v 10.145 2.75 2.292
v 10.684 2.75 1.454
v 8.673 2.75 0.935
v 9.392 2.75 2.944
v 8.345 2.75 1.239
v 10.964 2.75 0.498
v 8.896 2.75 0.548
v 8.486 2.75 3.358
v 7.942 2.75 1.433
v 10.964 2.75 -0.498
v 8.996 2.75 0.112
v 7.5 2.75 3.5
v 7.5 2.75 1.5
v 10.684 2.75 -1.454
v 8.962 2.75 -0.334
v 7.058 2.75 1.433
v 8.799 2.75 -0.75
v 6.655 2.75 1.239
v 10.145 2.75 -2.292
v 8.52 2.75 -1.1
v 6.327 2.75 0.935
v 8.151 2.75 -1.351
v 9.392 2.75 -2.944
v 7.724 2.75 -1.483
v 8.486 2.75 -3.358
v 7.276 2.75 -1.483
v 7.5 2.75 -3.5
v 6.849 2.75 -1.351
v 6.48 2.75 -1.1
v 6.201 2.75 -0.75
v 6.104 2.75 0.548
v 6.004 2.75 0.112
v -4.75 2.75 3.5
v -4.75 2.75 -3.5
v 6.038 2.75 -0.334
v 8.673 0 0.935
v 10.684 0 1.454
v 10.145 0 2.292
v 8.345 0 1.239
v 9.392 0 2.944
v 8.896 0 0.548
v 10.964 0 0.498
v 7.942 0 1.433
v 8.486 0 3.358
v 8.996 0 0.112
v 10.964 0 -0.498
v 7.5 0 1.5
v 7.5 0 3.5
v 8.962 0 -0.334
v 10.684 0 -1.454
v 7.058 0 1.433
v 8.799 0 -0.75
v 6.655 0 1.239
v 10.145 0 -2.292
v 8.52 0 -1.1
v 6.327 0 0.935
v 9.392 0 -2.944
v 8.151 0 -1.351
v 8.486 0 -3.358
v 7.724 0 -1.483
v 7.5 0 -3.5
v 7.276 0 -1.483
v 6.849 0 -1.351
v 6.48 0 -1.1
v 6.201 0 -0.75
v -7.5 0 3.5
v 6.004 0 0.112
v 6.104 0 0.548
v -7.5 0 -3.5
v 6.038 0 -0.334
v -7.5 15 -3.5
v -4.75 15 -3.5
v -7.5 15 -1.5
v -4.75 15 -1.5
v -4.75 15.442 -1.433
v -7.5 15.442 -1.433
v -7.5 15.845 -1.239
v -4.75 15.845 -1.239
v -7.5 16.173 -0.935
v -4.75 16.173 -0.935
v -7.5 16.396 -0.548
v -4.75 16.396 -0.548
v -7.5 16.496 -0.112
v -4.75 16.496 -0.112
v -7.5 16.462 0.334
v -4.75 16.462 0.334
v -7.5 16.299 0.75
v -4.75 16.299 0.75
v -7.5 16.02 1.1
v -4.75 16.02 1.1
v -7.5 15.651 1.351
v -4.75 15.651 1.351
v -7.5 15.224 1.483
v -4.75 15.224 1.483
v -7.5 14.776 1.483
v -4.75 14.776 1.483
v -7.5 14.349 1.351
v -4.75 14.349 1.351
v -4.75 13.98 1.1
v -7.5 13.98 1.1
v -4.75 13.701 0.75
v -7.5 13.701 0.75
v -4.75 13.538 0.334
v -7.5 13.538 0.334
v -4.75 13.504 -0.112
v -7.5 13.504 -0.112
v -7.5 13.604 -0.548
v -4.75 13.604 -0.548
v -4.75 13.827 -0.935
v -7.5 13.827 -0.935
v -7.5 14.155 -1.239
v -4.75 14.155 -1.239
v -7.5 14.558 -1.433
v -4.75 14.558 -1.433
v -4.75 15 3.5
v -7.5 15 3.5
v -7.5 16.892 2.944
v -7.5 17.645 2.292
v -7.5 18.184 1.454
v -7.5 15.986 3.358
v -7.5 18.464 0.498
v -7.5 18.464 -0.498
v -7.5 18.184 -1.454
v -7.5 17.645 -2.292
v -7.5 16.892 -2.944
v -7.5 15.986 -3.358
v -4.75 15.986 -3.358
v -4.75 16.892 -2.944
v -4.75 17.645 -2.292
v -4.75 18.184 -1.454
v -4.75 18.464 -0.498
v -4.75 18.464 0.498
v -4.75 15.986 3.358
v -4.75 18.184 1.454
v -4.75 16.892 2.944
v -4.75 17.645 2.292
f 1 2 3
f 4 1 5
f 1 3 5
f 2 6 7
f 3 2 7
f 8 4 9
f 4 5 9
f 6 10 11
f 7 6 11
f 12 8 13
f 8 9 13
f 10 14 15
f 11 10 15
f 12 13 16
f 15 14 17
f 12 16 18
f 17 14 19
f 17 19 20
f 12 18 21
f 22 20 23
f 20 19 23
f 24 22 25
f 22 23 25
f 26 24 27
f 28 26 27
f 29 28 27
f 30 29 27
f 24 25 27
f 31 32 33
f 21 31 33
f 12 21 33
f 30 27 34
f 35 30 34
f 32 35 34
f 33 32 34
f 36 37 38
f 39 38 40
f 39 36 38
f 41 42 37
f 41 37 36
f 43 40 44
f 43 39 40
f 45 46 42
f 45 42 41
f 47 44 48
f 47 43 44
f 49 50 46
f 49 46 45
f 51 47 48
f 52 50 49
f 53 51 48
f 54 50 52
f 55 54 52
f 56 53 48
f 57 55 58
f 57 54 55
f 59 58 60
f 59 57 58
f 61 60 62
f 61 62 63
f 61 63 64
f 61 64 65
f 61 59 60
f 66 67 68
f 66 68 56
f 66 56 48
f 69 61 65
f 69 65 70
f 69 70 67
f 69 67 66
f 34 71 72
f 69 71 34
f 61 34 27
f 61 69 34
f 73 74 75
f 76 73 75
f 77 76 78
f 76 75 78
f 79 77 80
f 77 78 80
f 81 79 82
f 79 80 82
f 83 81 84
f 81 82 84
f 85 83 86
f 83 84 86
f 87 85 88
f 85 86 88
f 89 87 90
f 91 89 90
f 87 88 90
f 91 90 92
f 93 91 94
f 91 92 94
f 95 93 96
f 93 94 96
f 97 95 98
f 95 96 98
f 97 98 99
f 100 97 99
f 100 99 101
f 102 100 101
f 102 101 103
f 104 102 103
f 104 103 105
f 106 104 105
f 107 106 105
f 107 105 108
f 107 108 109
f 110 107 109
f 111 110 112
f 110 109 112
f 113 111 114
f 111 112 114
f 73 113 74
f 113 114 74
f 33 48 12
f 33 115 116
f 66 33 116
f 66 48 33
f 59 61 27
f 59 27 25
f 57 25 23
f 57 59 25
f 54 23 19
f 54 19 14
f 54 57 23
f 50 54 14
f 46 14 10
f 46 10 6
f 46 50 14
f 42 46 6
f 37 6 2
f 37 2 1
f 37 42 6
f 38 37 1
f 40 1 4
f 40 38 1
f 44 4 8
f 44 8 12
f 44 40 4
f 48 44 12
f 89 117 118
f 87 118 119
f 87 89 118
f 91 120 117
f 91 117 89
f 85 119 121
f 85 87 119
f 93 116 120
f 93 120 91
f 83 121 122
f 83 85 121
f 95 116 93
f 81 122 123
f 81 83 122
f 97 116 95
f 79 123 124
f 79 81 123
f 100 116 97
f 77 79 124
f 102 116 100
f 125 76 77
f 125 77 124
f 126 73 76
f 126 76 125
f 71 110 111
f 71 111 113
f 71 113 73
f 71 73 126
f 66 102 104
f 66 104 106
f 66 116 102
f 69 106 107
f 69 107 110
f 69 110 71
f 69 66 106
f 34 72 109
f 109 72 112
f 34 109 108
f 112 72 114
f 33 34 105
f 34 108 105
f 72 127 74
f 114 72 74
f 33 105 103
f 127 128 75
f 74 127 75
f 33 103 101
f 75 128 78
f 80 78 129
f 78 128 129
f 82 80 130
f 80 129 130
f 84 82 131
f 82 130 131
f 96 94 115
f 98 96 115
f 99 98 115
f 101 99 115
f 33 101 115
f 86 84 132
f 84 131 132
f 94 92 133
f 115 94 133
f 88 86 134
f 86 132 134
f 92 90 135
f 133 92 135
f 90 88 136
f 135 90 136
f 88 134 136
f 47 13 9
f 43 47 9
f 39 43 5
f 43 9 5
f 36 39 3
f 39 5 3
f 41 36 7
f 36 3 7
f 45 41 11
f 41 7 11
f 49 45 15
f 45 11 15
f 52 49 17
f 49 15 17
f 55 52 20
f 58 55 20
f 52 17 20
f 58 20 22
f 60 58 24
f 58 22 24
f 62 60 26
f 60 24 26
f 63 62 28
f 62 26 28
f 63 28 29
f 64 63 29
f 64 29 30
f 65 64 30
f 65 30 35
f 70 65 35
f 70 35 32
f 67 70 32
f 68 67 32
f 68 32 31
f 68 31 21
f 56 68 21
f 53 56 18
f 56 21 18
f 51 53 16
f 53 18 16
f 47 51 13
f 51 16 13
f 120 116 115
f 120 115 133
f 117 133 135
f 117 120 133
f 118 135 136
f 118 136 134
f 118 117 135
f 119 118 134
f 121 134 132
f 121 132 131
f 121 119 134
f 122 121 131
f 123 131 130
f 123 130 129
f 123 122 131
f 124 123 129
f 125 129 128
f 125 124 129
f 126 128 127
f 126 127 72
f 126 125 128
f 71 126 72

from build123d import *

# Parameters (mm, degrees)
BOSS_EXTRUDE1_DEPTH = 2.75
SKETCH3_R           = 1.5
CUT_EXTRUDE1_DEPTH  = 2.75
BOSS_EXTRUDE2_DEPTH = 2.75
SKETCH6_R           = 1.5
CUT_EXTRUDE2_DEPTH  = 2.75


with BuildPart() as part:
    # Sketch1 → Boss-Extrude1 (new body)
    with BuildSketch(Plane(origin=(0, 0, 0), x_dir=(1, 0, 0), z_dir=(0, 1, 0))):
        with BuildLine():
            Line((-7.5, 3.5), (7.5, 3.5))
            ThreePointArc((7.5, 3.5), (11, 0), (7.5, -3.5))
            Line((7.5, -3.5), (-7.5, -3.5))
            Line((-7.5, -3.5), (-7.5, 3.5))
        make_face()
    extrude(amount=BOSS_EXTRUDE1_DEPTH)

    # Sketch3 → Cut-Extrude1 (cut)
    with BuildSketch(Plane(origin=(0, 2.75, 0), x_dir=(1, 0, 0), z_dir=(0, 1, 0))):
        with Locations(Location((7.5, 0, 0), (0, 0, 270))):
            Circle(SKETCH3_R)
    extrude(amount=-CUT_EXTRUDE1_DEPTH, mode=Mode.SUBTRACT)

    # Sketch5 → Boss-Extrude2 (add)
    with BuildSketch(Plane.ZY.offset(7.5)):
        with BuildLine():
            Line((-3.5, 0), (3.5, 0))
            Line((3.5, 0), (3.5, 15))
            ThreePointArc((3.5, 15), (0, 18.5), (-3.5, 15))
            Line((-3.5, 15), (-3.5, 0))
        make_face()
    extrude(amount=-BOSS_EXTRUDE2_DEPTH)

    # Sketch6 → Cut-Extrude2 (cut)
    with BuildSketch(Plane(origin=(-4.75, 0, 0), x_dir=(0, 0, -1), z_dir=(1, 0, 0))):
        with Locations((0, 15)):
            Circle(SKETCH6_R)
    extrude(amount=-CUT_EXTRUDE2_DEPTH, mode=Mode.SUBTRACT)


solid = part.part
